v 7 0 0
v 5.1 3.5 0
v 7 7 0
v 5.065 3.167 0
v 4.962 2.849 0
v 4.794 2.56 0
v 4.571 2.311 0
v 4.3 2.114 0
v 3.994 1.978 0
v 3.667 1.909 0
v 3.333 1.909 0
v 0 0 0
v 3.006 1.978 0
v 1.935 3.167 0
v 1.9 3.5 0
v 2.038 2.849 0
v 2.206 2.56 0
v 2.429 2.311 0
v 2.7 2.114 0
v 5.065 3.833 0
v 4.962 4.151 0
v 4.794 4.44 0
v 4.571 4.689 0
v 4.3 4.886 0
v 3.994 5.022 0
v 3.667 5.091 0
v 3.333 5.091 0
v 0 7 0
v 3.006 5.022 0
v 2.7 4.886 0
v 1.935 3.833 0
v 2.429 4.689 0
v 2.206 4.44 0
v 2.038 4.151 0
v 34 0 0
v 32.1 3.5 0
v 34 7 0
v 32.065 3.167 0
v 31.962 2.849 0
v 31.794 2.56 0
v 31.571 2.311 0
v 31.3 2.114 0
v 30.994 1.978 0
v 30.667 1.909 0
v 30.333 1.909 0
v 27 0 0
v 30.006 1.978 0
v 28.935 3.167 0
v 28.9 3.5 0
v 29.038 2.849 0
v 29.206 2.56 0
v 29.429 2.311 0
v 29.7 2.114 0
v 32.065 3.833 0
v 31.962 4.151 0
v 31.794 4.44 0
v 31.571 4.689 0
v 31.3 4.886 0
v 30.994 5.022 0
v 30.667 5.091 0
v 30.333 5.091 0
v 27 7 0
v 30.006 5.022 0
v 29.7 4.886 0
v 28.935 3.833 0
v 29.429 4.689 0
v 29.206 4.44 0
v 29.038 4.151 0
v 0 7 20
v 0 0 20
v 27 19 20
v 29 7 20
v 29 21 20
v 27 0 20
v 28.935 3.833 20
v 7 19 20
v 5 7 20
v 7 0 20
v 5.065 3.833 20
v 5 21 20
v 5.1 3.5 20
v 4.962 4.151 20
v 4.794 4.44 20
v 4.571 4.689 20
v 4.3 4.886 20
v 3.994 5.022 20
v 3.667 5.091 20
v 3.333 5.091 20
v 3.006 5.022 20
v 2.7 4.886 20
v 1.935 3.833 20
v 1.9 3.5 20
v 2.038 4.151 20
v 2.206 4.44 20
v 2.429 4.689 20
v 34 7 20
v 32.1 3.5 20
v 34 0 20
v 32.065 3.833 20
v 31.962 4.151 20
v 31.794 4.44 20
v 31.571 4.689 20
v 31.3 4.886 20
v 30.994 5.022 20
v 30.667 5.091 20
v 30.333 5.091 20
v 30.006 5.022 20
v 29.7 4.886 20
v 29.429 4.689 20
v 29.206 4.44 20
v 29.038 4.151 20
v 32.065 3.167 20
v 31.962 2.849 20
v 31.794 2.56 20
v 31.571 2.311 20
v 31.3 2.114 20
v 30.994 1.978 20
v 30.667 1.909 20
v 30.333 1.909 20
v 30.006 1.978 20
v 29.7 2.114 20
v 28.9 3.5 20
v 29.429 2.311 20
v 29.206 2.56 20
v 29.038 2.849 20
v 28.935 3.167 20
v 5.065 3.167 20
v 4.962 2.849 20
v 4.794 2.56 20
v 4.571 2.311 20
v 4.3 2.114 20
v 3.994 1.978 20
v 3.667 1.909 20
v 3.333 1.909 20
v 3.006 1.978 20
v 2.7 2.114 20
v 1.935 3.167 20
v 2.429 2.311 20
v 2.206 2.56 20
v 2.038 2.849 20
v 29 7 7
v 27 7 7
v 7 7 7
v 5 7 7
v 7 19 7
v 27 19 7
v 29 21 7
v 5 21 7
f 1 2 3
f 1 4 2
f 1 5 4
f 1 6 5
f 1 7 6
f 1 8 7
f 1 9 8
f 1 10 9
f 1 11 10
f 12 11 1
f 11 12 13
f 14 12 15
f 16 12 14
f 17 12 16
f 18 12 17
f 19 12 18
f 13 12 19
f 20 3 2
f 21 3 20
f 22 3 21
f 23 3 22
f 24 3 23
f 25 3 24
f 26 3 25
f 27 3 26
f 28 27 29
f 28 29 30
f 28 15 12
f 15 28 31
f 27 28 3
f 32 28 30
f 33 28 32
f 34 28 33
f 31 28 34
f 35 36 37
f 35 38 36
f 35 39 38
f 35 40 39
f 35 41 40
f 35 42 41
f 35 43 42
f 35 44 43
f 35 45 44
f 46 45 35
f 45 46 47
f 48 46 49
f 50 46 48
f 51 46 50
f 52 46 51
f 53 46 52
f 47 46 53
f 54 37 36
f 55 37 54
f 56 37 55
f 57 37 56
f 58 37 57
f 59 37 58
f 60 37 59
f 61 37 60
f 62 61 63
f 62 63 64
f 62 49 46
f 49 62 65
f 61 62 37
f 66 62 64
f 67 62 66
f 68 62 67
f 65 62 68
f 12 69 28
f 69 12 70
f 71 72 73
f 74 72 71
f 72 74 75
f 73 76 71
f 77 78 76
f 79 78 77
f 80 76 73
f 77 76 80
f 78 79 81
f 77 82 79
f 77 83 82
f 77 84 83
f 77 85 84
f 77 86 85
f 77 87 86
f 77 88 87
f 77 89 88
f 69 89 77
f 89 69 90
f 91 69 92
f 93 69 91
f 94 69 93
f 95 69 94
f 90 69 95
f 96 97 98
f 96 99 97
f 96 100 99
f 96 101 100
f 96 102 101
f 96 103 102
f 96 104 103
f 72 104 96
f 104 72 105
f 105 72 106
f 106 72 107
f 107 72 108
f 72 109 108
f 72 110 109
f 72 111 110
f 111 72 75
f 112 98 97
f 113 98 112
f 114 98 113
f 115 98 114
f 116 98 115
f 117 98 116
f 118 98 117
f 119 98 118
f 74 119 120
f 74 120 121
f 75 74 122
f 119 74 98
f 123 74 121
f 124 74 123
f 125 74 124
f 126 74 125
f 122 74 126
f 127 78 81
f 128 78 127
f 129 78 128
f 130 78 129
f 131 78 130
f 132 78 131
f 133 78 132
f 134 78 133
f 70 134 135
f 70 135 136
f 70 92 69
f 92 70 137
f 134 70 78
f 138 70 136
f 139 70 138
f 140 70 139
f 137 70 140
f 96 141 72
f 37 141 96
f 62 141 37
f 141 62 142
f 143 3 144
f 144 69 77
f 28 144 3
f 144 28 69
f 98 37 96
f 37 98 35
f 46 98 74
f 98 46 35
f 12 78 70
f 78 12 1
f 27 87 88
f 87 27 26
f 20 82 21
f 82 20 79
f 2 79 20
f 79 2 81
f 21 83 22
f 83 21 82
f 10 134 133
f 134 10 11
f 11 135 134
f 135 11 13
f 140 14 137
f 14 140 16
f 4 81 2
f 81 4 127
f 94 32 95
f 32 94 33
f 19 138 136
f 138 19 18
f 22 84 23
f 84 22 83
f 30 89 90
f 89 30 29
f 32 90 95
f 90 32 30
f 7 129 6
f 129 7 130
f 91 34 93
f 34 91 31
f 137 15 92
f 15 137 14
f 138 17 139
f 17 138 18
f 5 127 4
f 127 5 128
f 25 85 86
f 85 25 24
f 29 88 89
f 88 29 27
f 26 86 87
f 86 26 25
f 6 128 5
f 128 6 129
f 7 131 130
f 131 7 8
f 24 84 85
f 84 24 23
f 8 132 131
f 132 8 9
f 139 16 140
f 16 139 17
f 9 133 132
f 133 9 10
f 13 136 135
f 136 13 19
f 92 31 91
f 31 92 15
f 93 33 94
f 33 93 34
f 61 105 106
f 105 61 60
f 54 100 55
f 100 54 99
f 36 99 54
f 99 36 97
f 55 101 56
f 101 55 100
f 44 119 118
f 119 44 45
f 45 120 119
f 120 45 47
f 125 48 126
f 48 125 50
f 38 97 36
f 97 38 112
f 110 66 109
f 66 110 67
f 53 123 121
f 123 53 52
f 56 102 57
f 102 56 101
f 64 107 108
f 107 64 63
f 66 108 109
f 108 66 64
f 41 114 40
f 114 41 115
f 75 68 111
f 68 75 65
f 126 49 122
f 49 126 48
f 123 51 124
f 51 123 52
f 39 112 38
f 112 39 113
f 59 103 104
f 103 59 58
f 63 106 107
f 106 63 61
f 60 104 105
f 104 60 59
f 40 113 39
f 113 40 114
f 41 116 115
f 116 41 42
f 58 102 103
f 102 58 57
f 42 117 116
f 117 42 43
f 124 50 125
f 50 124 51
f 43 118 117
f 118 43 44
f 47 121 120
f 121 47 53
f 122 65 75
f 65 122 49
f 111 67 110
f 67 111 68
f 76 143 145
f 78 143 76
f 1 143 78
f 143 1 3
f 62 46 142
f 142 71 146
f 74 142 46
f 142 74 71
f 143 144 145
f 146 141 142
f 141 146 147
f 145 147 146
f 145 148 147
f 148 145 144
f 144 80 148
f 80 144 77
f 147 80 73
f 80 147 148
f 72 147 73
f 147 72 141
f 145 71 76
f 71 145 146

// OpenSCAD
$fn=30;

union() {
    difference() {
        linear_extrude(height=20)
            square([34, 7]);
        translate([3.5, 3.5, 0])
            cylinder(d=3.2, h=20);
        translate([34-3.5, 3.5, 0])
            cylinder(d=3.2, h=20);
        
        translate([7, 0, 0])
        linear_extrude(height=20)
        square(20,7);
    }
    
    translate([5, 6, 7])
    difference() {    
        linear_extrude(height=13)
        square([24, 15]);

        translate([2, -2, 0])
        linear_extrude(height=13)
        square([20, 15]);
        
    }
}
